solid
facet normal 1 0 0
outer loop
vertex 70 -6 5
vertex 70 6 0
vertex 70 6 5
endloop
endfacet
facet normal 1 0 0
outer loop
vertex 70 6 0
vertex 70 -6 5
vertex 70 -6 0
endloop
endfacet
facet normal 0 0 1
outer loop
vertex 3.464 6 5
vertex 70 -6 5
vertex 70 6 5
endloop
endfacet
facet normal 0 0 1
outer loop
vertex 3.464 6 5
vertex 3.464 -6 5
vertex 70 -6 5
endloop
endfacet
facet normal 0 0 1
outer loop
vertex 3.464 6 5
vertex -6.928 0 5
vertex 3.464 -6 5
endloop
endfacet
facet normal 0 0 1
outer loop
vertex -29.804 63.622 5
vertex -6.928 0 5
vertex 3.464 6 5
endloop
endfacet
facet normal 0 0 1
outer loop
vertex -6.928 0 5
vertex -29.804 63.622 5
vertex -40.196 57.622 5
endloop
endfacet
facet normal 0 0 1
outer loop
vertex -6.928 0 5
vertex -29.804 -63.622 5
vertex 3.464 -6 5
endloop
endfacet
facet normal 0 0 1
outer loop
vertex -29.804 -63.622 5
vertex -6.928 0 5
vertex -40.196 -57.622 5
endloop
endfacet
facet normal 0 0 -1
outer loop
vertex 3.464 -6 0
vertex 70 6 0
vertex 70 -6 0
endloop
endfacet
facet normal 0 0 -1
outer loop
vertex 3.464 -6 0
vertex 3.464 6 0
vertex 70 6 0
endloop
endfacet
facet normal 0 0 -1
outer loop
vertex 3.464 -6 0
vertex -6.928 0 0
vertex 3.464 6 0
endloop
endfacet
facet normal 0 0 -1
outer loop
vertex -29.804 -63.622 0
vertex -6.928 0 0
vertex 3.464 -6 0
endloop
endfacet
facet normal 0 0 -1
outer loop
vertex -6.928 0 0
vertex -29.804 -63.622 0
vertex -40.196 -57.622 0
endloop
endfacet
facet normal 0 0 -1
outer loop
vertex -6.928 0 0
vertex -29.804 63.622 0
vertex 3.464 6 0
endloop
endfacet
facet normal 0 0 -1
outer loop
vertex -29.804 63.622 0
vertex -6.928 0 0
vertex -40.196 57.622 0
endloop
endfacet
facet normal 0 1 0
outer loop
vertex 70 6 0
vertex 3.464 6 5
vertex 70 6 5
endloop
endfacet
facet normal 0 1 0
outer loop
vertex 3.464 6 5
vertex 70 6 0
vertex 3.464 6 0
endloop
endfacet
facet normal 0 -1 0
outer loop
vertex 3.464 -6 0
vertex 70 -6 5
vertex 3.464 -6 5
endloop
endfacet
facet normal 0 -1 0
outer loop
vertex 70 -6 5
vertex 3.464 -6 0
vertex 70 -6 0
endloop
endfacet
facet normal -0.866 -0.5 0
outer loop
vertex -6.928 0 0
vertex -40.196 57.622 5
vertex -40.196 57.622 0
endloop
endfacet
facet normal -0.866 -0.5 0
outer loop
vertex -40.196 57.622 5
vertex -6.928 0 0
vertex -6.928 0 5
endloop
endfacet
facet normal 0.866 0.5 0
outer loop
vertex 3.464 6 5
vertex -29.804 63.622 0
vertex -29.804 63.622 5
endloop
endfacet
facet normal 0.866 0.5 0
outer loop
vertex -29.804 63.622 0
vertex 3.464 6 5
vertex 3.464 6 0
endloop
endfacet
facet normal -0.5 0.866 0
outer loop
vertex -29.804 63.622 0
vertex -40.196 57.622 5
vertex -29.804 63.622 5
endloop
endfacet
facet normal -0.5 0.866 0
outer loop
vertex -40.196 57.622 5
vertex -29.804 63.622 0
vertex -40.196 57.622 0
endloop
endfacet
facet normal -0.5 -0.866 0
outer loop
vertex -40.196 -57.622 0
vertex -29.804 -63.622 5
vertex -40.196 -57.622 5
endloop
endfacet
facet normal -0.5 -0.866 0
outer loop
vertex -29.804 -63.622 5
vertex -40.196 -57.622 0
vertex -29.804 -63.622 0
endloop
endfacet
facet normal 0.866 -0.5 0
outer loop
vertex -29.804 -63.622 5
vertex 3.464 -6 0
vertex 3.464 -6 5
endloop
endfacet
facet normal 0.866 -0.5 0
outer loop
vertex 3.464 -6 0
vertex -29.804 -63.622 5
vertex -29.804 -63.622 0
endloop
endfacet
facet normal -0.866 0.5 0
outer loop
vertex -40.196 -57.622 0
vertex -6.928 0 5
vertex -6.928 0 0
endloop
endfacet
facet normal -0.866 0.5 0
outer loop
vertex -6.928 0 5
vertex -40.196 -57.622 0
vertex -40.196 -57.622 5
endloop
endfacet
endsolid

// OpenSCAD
// Spacer for placing hexagonal acoustic panels evenly on a wall

length = 70;
width = 12;
thickness = 5;

union() {
    translate([0, -width/2, 0])
        cube([length, width, thickness]);
    rotate([0, 0, 120])
        translate([0, -width/2, 0])
            cube([length, width, thickness]);
    rotate([0, 0, 240])
        translate([0, -width/2, 0])
            cube([length, width, thickness]);
}
